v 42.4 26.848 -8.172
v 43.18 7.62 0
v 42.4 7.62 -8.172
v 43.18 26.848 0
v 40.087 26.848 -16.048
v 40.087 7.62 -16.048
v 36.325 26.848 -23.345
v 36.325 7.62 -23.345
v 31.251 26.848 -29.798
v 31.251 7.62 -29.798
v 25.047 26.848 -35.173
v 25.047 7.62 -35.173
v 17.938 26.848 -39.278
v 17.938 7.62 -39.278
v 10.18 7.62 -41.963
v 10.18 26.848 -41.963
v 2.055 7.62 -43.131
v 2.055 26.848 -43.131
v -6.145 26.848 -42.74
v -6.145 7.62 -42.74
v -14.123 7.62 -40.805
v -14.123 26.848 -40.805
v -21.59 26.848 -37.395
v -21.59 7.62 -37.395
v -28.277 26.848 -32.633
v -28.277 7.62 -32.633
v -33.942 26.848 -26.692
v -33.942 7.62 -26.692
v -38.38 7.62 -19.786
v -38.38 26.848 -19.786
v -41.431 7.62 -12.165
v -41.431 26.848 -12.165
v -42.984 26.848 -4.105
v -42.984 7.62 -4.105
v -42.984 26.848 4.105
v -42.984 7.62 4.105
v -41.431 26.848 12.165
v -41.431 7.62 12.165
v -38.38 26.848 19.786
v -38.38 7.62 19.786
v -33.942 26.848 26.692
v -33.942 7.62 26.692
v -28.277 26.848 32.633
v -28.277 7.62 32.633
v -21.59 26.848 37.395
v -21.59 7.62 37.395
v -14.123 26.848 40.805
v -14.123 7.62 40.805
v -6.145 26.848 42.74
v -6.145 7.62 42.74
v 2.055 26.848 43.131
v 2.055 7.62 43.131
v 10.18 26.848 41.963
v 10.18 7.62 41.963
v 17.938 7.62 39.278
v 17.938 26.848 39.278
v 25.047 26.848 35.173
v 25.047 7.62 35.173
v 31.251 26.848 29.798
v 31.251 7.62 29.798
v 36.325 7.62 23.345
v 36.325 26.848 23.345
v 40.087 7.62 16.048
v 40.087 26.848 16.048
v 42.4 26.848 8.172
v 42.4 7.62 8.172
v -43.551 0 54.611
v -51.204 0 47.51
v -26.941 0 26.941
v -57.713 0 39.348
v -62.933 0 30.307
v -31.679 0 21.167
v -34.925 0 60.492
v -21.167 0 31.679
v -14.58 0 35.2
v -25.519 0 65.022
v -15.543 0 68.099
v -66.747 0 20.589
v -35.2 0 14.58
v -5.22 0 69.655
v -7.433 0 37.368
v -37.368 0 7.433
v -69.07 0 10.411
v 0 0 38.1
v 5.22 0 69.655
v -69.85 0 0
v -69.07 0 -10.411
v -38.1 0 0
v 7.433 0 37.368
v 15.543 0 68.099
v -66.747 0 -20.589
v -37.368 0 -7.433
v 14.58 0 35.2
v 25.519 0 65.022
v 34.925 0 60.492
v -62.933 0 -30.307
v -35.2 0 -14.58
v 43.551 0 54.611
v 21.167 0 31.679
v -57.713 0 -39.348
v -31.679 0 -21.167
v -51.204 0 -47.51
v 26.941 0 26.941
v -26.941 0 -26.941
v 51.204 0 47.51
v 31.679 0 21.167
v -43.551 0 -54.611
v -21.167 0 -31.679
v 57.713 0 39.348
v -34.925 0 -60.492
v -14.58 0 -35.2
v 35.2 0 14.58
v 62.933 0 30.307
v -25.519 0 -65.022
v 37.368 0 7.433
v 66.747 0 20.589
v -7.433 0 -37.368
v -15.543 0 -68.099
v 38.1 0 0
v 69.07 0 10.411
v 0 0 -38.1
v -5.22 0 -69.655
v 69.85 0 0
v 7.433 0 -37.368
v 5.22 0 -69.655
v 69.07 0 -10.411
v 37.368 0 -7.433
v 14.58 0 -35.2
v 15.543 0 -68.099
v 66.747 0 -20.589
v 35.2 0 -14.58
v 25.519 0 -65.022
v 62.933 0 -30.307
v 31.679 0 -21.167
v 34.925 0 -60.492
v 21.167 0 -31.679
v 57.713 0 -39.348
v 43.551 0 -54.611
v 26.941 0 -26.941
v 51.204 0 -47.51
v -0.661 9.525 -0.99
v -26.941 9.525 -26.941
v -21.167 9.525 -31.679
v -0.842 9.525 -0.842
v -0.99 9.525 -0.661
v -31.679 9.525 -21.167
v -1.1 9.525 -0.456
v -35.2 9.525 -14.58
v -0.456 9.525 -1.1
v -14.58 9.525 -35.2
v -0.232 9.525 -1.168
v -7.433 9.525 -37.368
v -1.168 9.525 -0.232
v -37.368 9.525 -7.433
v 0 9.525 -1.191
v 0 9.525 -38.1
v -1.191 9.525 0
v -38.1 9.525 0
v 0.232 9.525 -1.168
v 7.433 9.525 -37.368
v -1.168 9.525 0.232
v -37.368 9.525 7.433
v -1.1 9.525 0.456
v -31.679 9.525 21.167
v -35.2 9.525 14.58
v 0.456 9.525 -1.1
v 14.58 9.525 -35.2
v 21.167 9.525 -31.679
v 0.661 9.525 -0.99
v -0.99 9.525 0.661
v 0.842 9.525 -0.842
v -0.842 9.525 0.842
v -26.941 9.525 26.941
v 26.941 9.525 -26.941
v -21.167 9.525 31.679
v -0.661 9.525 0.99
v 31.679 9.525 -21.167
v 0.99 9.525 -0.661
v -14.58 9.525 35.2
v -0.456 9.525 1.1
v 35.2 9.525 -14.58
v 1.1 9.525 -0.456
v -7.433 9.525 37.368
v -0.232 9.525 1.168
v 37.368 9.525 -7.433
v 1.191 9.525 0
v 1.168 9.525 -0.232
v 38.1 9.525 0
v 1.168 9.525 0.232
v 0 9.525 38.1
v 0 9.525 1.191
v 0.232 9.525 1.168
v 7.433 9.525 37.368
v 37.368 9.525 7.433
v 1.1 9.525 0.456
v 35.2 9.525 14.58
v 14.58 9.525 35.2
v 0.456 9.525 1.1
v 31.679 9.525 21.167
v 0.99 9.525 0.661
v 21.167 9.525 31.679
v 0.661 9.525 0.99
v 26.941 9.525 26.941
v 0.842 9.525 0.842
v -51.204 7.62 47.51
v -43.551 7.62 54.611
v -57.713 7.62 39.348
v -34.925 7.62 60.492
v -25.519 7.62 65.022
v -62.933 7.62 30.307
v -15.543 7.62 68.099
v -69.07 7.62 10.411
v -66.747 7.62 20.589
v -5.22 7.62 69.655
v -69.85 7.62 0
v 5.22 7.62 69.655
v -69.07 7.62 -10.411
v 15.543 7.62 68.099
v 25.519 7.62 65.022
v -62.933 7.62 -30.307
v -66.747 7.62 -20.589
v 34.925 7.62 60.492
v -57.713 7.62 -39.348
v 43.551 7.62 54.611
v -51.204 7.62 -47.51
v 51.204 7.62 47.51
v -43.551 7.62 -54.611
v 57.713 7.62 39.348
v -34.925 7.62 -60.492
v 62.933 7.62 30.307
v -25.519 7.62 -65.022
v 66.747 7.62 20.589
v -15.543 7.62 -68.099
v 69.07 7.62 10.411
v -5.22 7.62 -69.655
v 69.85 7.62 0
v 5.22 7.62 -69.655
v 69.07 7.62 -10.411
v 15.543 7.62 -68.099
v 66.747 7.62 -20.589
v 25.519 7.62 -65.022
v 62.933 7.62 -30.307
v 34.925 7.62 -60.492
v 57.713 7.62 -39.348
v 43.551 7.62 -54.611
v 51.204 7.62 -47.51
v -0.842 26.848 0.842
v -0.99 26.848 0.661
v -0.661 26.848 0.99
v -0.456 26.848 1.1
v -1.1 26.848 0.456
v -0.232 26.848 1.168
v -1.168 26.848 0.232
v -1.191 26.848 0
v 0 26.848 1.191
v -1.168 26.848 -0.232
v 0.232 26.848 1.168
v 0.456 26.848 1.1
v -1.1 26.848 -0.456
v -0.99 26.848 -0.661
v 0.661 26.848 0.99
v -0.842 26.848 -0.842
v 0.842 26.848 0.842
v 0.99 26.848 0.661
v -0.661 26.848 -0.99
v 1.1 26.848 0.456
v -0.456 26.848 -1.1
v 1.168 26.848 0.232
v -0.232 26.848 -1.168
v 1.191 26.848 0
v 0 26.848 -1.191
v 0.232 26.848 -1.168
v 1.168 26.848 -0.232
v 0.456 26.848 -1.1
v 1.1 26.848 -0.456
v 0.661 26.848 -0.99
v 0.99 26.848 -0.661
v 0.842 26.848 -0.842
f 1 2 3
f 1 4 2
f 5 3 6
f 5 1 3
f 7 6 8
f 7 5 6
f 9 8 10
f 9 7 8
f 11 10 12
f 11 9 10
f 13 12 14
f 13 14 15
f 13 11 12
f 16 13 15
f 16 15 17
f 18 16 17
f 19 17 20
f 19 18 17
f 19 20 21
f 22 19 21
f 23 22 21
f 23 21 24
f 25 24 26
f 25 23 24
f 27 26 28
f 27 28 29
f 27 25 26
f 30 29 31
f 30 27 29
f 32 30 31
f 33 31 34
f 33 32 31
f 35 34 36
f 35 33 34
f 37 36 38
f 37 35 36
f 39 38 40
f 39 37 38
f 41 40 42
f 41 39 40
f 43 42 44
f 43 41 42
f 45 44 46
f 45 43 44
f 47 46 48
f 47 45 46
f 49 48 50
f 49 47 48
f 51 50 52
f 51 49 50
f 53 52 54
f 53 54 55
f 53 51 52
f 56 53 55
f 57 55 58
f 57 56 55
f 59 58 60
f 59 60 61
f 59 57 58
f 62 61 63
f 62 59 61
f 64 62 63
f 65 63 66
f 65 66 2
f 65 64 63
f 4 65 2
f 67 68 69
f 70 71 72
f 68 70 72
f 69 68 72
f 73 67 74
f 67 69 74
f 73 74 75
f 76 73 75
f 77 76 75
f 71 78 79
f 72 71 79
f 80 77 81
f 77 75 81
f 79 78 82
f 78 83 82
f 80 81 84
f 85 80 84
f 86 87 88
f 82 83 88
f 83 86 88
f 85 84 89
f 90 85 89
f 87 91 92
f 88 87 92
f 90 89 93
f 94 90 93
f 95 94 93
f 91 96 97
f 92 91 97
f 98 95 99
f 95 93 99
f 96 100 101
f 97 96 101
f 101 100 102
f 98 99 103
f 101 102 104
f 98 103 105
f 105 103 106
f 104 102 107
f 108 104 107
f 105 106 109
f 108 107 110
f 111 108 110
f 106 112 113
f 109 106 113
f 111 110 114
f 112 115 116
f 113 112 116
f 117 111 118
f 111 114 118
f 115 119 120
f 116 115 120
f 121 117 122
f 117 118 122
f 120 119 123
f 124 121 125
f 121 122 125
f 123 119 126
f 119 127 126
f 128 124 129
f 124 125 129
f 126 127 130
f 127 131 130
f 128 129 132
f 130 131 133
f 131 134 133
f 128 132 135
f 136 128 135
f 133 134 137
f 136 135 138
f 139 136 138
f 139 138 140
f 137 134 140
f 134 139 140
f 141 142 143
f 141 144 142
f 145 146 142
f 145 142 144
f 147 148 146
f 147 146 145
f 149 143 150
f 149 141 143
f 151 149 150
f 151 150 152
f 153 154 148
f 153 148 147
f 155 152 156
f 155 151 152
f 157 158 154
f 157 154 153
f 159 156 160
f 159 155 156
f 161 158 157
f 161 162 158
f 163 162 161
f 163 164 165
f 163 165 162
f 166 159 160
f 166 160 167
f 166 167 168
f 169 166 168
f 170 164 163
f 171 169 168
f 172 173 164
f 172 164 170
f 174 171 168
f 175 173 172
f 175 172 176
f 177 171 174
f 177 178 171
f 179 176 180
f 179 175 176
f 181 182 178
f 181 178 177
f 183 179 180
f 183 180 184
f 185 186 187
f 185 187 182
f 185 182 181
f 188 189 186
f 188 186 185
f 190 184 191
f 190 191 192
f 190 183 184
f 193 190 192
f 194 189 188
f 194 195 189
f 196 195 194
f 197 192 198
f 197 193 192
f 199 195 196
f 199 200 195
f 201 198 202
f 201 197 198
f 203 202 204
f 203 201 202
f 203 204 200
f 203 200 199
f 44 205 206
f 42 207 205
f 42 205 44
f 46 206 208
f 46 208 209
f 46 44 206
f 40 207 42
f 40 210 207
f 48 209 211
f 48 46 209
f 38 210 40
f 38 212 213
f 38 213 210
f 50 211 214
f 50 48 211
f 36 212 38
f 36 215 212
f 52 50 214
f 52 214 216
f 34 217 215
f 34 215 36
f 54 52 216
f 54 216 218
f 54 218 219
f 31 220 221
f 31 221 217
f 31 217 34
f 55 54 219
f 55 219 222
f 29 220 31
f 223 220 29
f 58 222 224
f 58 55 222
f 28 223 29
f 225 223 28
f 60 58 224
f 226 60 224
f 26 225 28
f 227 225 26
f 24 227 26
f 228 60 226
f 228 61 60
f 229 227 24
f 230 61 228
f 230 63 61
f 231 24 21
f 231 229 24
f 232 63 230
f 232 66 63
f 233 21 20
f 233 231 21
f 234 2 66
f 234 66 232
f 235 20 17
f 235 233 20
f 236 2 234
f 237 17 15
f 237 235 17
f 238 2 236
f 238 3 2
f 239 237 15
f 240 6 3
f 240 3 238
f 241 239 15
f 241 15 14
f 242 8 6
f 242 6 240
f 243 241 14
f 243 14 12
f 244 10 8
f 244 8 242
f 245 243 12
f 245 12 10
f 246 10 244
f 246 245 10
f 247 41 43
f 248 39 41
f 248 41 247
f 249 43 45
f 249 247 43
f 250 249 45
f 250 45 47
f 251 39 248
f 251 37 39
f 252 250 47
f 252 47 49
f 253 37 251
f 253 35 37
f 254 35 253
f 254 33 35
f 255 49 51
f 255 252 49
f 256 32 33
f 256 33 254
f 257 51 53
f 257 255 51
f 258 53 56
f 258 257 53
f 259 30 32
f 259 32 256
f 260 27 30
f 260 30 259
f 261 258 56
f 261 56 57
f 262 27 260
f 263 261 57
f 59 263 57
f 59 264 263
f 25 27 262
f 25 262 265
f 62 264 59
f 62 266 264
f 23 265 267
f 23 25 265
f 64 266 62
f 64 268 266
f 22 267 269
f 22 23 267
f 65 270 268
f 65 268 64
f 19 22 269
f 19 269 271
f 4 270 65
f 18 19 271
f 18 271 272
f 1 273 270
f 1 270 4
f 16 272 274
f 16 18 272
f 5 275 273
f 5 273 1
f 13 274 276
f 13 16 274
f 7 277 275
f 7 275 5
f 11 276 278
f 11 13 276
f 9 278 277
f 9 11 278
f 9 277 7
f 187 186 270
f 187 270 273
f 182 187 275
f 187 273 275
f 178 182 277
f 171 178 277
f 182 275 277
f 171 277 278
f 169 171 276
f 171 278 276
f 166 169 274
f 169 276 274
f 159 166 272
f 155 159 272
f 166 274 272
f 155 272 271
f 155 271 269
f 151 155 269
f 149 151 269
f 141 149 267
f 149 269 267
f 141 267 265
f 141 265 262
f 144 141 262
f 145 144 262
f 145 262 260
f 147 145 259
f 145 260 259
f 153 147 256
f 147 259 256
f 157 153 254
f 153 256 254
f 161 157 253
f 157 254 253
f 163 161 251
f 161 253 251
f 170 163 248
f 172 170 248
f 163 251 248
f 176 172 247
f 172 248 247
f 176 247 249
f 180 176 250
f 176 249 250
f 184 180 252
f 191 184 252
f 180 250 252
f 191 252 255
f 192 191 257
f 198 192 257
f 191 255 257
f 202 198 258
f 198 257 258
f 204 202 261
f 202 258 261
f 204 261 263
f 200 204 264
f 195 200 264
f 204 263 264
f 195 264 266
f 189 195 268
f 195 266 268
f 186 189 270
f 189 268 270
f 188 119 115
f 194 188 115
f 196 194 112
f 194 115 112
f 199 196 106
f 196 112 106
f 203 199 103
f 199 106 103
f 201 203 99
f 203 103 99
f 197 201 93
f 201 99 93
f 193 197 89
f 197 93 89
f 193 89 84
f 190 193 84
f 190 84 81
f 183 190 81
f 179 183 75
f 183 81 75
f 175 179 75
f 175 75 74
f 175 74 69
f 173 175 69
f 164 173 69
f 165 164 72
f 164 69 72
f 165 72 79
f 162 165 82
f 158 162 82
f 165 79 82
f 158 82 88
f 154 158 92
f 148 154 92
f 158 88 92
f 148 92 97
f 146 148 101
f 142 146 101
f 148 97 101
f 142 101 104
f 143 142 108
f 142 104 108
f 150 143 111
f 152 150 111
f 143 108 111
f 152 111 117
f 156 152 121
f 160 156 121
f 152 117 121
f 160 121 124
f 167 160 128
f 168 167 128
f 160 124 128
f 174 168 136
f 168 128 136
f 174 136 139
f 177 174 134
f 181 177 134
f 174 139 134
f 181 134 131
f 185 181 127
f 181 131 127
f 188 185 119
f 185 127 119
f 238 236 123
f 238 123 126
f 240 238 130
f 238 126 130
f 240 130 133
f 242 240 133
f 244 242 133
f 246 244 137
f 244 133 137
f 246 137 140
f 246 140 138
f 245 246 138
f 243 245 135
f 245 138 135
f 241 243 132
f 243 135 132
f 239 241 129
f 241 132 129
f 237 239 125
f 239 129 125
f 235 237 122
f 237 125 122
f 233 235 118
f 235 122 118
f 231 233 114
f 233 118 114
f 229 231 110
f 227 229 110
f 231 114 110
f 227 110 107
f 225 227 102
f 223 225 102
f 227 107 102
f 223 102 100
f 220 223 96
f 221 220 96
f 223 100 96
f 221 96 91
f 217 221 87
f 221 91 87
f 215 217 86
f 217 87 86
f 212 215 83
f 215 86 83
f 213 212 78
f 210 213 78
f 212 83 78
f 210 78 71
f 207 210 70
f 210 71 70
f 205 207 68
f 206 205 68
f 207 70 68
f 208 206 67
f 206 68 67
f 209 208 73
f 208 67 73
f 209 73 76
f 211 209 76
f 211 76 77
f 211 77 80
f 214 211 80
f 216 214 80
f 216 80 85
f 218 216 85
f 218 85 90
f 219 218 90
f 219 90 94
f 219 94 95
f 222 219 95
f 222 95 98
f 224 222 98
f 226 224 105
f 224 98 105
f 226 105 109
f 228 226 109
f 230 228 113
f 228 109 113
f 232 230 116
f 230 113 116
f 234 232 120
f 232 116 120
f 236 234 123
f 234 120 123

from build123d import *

# Parameters (mm, degrees)
SKETCH1_R                = 69.85
BOSS_EXTRUDE1_DEPTH      = 7.62
SKETCH5_R                = 43.18
BOSS_EXTRUDE2_DEPTH      = 12.7
BOSS_EXTRUDE2_DEPTH_BACK = 14.1478
SKETCH6_R                = 1.190625
CUT_EXTRUDE2_DEPTH       = 17.3228
SKETCH7_R                = 38.1
CUT_EXTRUDE3_DEPTH       = 9.525


with BuildPart() as part:
    # Sketch1 → Boss-Extrude1 (new body)
    with BuildSketch(Plane(origin=(0, 0, 0), x_dir=(1, 0, 0), z_dir=(0, 1, 0))):
        Circle(SKETCH1_R)
    extrude(amount=BOSS_EXTRUDE1_DEPTH)

    # Sketch3 → Revolve1 (revolve)
    with BuildSketch(Plane.XY):
        Polygon((0, 14.1478), (31.873518738, 14.1478), (43.18, 7.62), (0, 7.62), align=None)
    revolve(axis=Axis((0, 7.62, 0), (0, 1, 0)))

    # Sketch5 → Boss-Extrude2 (add, two sides)
    with BuildSketch(Plane(origin=(0, 14.1478, 0), x_dir=(1, 0, 0), z_dir=(0, 1, 0))) as boss_extrude2_sk:
        Circle(SKETCH5_R)
    extrude(amount=BOSS_EXTRUDE2_DEPTH)
    extrude(boss_extrude2_sk.sketch, amount=-BOSS_EXTRUDE2_DEPTH_BACK)

    # Sketch6 → Cut-Extrude2 (cut)
    with BuildSketch(Plane(origin=(0, 26.8478, 0), x_dir=(1, 0, 0), z_dir=(0, 1, 0))):
        Circle(SKETCH6_R)
    extrude(amount=-CUT_EXTRUDE2_DEPTH, mode=Mode.SUBTRACT)

    # Sketch7 → Cut-Extrude3 (cut)
    with BuildSketch(Plane.XZ):
        Circle(SKETCH7_R)
    extrude(amount=-CUT_EXTRUDE3_DEPTH, mode=Mode.SUBTRACT)


solid = part.part
